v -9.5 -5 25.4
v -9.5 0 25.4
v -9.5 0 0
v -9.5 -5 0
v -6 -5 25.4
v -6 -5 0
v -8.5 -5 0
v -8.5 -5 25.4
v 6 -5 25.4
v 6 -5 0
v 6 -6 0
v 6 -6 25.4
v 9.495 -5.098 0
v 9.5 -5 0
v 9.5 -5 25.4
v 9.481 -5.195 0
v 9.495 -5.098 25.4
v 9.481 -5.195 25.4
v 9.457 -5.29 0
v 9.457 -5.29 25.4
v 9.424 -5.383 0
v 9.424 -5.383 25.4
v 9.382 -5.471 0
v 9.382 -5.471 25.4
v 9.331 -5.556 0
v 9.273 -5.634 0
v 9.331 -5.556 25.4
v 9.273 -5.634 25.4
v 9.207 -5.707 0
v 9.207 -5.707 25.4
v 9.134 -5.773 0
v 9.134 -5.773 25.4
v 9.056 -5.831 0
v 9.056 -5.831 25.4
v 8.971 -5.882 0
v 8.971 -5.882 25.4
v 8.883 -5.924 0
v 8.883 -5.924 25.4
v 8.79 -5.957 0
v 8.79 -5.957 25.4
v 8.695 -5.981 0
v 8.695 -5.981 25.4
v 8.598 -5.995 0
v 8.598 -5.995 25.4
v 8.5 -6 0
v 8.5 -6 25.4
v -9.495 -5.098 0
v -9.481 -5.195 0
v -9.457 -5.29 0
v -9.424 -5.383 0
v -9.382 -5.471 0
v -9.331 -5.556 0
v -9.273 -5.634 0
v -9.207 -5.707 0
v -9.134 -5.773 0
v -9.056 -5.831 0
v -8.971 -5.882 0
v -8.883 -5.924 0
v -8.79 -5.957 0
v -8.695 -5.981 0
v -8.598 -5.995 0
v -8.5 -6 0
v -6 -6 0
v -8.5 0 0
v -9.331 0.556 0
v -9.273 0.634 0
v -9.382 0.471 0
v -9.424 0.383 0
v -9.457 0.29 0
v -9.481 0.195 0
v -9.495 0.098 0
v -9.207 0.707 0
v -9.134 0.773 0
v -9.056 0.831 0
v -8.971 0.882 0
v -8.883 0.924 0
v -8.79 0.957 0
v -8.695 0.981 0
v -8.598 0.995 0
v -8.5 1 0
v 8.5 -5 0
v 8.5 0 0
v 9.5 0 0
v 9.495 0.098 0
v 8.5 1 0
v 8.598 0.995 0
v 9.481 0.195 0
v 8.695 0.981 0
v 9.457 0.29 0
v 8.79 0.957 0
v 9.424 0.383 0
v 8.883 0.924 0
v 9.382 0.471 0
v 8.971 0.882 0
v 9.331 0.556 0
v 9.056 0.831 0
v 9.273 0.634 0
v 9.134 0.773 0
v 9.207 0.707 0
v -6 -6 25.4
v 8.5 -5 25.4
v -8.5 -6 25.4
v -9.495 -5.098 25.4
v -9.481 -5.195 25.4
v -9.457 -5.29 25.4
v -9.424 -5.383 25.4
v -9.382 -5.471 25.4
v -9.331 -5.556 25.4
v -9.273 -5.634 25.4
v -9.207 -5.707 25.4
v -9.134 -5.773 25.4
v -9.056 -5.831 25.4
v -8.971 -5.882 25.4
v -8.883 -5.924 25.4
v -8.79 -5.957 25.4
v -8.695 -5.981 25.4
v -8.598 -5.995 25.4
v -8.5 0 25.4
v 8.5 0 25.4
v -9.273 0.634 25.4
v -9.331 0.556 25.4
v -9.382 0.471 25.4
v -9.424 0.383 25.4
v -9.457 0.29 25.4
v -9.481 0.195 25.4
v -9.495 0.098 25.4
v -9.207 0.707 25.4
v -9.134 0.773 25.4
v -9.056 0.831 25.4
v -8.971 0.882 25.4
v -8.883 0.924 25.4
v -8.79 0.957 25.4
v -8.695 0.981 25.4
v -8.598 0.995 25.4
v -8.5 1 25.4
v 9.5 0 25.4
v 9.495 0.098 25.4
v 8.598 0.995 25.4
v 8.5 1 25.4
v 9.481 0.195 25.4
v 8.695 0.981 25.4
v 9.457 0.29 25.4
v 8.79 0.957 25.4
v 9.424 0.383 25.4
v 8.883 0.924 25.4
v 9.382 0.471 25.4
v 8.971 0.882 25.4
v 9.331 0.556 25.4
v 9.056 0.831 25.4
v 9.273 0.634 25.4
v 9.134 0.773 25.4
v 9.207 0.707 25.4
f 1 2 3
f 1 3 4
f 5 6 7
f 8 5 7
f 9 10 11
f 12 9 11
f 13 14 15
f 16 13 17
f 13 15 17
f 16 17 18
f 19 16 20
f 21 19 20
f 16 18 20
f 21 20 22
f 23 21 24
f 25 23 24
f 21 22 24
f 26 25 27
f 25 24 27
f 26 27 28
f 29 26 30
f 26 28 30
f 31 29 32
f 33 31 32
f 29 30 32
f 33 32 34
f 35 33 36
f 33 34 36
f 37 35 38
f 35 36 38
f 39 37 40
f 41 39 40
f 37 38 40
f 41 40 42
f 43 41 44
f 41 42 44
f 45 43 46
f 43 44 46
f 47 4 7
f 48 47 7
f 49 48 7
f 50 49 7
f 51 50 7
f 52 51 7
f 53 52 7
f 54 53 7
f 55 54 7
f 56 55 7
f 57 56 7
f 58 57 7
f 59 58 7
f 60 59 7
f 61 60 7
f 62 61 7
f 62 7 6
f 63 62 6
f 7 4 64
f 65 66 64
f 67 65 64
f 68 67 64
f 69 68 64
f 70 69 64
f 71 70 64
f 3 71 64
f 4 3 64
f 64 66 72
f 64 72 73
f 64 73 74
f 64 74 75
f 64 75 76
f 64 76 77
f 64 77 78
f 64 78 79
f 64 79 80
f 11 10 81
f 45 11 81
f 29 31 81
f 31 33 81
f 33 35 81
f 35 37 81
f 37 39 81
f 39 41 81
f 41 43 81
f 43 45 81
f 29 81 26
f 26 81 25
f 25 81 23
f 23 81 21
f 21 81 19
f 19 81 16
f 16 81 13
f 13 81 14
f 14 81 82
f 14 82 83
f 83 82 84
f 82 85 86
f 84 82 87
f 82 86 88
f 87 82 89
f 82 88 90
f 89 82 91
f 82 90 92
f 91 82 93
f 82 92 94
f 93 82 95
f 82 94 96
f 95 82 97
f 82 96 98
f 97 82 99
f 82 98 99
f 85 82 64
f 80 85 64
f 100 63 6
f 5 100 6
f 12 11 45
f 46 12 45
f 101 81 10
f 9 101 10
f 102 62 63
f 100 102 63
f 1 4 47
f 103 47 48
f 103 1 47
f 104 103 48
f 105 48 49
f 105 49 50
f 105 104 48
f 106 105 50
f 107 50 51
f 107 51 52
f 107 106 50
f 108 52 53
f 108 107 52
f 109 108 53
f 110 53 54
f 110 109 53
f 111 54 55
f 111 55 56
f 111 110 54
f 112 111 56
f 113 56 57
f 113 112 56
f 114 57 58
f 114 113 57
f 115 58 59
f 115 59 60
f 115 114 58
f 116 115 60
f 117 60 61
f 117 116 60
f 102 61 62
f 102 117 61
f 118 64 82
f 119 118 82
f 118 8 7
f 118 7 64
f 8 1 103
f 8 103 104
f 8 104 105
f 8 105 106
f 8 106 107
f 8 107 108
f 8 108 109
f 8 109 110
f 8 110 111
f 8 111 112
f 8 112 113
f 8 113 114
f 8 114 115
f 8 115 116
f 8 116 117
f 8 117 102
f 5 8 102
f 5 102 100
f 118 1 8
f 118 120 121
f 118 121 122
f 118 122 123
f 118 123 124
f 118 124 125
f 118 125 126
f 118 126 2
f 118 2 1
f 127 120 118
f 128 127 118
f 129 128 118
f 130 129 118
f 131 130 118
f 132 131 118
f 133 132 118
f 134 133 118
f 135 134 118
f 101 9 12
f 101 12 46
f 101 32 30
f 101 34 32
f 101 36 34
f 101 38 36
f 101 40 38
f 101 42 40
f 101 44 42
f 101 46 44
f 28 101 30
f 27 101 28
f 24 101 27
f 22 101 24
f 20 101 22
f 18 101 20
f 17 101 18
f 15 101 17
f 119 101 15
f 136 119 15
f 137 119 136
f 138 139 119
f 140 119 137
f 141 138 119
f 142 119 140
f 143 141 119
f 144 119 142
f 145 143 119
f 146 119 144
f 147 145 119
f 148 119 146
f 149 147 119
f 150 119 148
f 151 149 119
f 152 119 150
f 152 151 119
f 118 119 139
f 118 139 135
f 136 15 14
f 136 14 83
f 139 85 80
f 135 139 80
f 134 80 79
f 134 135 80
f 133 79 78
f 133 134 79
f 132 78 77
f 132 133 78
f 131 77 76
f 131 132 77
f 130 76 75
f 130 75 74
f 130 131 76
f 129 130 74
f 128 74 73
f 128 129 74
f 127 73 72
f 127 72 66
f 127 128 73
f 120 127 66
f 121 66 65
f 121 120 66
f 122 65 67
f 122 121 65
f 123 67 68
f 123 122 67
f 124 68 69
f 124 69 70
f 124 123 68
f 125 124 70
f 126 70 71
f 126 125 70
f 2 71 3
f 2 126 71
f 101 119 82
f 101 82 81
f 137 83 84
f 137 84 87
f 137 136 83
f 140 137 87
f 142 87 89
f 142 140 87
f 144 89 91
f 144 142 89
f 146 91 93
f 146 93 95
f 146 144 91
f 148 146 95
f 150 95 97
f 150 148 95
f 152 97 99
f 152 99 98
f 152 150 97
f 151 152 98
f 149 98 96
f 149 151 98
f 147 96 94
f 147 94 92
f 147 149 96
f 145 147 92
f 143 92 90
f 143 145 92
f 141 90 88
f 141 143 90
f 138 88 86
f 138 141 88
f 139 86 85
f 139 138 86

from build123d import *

# Parameters (mm, degrees)
F1_DEPTH = 25.4
F2_R     = 1
F3_R     = 1


with BuildPart() as f1:
    # F0 (on Top) → F1 (new body)
    with BuildSketch(Plane.XY):
        Polygon((-8.5, 0), (0, 0), (0, 1), (-9.5, 1), (-9.5, -6), (-6, -6), (-6, -5), (-8.5, -5), align=None)
        Polygon((0, 1), (0, 0), (8.5, 0), (8.5, -5), (6, -5), (6, -6), (9.5, -6), (9.5, 1), align=None)
    extrude(amount=F1_DEPTH)

    # F2
    f2_edges = [f1.edges().sort_by_distance(p)[0] for p in [
        (-9.5, 1, 12.7),
        (9.5, 1, 12.7),
    ]]
    fillet(f2_edges, radius=F2_R)

    # F3
    f3_edges = [f1.edges().sort_by_distance(p)[0] for p in [
        (-9.5, -6, 12.7),
        (9.5, -6, 12.7),
    ]]
    fillet(f3_edges, radius=F3_R)


solid = f1.part
